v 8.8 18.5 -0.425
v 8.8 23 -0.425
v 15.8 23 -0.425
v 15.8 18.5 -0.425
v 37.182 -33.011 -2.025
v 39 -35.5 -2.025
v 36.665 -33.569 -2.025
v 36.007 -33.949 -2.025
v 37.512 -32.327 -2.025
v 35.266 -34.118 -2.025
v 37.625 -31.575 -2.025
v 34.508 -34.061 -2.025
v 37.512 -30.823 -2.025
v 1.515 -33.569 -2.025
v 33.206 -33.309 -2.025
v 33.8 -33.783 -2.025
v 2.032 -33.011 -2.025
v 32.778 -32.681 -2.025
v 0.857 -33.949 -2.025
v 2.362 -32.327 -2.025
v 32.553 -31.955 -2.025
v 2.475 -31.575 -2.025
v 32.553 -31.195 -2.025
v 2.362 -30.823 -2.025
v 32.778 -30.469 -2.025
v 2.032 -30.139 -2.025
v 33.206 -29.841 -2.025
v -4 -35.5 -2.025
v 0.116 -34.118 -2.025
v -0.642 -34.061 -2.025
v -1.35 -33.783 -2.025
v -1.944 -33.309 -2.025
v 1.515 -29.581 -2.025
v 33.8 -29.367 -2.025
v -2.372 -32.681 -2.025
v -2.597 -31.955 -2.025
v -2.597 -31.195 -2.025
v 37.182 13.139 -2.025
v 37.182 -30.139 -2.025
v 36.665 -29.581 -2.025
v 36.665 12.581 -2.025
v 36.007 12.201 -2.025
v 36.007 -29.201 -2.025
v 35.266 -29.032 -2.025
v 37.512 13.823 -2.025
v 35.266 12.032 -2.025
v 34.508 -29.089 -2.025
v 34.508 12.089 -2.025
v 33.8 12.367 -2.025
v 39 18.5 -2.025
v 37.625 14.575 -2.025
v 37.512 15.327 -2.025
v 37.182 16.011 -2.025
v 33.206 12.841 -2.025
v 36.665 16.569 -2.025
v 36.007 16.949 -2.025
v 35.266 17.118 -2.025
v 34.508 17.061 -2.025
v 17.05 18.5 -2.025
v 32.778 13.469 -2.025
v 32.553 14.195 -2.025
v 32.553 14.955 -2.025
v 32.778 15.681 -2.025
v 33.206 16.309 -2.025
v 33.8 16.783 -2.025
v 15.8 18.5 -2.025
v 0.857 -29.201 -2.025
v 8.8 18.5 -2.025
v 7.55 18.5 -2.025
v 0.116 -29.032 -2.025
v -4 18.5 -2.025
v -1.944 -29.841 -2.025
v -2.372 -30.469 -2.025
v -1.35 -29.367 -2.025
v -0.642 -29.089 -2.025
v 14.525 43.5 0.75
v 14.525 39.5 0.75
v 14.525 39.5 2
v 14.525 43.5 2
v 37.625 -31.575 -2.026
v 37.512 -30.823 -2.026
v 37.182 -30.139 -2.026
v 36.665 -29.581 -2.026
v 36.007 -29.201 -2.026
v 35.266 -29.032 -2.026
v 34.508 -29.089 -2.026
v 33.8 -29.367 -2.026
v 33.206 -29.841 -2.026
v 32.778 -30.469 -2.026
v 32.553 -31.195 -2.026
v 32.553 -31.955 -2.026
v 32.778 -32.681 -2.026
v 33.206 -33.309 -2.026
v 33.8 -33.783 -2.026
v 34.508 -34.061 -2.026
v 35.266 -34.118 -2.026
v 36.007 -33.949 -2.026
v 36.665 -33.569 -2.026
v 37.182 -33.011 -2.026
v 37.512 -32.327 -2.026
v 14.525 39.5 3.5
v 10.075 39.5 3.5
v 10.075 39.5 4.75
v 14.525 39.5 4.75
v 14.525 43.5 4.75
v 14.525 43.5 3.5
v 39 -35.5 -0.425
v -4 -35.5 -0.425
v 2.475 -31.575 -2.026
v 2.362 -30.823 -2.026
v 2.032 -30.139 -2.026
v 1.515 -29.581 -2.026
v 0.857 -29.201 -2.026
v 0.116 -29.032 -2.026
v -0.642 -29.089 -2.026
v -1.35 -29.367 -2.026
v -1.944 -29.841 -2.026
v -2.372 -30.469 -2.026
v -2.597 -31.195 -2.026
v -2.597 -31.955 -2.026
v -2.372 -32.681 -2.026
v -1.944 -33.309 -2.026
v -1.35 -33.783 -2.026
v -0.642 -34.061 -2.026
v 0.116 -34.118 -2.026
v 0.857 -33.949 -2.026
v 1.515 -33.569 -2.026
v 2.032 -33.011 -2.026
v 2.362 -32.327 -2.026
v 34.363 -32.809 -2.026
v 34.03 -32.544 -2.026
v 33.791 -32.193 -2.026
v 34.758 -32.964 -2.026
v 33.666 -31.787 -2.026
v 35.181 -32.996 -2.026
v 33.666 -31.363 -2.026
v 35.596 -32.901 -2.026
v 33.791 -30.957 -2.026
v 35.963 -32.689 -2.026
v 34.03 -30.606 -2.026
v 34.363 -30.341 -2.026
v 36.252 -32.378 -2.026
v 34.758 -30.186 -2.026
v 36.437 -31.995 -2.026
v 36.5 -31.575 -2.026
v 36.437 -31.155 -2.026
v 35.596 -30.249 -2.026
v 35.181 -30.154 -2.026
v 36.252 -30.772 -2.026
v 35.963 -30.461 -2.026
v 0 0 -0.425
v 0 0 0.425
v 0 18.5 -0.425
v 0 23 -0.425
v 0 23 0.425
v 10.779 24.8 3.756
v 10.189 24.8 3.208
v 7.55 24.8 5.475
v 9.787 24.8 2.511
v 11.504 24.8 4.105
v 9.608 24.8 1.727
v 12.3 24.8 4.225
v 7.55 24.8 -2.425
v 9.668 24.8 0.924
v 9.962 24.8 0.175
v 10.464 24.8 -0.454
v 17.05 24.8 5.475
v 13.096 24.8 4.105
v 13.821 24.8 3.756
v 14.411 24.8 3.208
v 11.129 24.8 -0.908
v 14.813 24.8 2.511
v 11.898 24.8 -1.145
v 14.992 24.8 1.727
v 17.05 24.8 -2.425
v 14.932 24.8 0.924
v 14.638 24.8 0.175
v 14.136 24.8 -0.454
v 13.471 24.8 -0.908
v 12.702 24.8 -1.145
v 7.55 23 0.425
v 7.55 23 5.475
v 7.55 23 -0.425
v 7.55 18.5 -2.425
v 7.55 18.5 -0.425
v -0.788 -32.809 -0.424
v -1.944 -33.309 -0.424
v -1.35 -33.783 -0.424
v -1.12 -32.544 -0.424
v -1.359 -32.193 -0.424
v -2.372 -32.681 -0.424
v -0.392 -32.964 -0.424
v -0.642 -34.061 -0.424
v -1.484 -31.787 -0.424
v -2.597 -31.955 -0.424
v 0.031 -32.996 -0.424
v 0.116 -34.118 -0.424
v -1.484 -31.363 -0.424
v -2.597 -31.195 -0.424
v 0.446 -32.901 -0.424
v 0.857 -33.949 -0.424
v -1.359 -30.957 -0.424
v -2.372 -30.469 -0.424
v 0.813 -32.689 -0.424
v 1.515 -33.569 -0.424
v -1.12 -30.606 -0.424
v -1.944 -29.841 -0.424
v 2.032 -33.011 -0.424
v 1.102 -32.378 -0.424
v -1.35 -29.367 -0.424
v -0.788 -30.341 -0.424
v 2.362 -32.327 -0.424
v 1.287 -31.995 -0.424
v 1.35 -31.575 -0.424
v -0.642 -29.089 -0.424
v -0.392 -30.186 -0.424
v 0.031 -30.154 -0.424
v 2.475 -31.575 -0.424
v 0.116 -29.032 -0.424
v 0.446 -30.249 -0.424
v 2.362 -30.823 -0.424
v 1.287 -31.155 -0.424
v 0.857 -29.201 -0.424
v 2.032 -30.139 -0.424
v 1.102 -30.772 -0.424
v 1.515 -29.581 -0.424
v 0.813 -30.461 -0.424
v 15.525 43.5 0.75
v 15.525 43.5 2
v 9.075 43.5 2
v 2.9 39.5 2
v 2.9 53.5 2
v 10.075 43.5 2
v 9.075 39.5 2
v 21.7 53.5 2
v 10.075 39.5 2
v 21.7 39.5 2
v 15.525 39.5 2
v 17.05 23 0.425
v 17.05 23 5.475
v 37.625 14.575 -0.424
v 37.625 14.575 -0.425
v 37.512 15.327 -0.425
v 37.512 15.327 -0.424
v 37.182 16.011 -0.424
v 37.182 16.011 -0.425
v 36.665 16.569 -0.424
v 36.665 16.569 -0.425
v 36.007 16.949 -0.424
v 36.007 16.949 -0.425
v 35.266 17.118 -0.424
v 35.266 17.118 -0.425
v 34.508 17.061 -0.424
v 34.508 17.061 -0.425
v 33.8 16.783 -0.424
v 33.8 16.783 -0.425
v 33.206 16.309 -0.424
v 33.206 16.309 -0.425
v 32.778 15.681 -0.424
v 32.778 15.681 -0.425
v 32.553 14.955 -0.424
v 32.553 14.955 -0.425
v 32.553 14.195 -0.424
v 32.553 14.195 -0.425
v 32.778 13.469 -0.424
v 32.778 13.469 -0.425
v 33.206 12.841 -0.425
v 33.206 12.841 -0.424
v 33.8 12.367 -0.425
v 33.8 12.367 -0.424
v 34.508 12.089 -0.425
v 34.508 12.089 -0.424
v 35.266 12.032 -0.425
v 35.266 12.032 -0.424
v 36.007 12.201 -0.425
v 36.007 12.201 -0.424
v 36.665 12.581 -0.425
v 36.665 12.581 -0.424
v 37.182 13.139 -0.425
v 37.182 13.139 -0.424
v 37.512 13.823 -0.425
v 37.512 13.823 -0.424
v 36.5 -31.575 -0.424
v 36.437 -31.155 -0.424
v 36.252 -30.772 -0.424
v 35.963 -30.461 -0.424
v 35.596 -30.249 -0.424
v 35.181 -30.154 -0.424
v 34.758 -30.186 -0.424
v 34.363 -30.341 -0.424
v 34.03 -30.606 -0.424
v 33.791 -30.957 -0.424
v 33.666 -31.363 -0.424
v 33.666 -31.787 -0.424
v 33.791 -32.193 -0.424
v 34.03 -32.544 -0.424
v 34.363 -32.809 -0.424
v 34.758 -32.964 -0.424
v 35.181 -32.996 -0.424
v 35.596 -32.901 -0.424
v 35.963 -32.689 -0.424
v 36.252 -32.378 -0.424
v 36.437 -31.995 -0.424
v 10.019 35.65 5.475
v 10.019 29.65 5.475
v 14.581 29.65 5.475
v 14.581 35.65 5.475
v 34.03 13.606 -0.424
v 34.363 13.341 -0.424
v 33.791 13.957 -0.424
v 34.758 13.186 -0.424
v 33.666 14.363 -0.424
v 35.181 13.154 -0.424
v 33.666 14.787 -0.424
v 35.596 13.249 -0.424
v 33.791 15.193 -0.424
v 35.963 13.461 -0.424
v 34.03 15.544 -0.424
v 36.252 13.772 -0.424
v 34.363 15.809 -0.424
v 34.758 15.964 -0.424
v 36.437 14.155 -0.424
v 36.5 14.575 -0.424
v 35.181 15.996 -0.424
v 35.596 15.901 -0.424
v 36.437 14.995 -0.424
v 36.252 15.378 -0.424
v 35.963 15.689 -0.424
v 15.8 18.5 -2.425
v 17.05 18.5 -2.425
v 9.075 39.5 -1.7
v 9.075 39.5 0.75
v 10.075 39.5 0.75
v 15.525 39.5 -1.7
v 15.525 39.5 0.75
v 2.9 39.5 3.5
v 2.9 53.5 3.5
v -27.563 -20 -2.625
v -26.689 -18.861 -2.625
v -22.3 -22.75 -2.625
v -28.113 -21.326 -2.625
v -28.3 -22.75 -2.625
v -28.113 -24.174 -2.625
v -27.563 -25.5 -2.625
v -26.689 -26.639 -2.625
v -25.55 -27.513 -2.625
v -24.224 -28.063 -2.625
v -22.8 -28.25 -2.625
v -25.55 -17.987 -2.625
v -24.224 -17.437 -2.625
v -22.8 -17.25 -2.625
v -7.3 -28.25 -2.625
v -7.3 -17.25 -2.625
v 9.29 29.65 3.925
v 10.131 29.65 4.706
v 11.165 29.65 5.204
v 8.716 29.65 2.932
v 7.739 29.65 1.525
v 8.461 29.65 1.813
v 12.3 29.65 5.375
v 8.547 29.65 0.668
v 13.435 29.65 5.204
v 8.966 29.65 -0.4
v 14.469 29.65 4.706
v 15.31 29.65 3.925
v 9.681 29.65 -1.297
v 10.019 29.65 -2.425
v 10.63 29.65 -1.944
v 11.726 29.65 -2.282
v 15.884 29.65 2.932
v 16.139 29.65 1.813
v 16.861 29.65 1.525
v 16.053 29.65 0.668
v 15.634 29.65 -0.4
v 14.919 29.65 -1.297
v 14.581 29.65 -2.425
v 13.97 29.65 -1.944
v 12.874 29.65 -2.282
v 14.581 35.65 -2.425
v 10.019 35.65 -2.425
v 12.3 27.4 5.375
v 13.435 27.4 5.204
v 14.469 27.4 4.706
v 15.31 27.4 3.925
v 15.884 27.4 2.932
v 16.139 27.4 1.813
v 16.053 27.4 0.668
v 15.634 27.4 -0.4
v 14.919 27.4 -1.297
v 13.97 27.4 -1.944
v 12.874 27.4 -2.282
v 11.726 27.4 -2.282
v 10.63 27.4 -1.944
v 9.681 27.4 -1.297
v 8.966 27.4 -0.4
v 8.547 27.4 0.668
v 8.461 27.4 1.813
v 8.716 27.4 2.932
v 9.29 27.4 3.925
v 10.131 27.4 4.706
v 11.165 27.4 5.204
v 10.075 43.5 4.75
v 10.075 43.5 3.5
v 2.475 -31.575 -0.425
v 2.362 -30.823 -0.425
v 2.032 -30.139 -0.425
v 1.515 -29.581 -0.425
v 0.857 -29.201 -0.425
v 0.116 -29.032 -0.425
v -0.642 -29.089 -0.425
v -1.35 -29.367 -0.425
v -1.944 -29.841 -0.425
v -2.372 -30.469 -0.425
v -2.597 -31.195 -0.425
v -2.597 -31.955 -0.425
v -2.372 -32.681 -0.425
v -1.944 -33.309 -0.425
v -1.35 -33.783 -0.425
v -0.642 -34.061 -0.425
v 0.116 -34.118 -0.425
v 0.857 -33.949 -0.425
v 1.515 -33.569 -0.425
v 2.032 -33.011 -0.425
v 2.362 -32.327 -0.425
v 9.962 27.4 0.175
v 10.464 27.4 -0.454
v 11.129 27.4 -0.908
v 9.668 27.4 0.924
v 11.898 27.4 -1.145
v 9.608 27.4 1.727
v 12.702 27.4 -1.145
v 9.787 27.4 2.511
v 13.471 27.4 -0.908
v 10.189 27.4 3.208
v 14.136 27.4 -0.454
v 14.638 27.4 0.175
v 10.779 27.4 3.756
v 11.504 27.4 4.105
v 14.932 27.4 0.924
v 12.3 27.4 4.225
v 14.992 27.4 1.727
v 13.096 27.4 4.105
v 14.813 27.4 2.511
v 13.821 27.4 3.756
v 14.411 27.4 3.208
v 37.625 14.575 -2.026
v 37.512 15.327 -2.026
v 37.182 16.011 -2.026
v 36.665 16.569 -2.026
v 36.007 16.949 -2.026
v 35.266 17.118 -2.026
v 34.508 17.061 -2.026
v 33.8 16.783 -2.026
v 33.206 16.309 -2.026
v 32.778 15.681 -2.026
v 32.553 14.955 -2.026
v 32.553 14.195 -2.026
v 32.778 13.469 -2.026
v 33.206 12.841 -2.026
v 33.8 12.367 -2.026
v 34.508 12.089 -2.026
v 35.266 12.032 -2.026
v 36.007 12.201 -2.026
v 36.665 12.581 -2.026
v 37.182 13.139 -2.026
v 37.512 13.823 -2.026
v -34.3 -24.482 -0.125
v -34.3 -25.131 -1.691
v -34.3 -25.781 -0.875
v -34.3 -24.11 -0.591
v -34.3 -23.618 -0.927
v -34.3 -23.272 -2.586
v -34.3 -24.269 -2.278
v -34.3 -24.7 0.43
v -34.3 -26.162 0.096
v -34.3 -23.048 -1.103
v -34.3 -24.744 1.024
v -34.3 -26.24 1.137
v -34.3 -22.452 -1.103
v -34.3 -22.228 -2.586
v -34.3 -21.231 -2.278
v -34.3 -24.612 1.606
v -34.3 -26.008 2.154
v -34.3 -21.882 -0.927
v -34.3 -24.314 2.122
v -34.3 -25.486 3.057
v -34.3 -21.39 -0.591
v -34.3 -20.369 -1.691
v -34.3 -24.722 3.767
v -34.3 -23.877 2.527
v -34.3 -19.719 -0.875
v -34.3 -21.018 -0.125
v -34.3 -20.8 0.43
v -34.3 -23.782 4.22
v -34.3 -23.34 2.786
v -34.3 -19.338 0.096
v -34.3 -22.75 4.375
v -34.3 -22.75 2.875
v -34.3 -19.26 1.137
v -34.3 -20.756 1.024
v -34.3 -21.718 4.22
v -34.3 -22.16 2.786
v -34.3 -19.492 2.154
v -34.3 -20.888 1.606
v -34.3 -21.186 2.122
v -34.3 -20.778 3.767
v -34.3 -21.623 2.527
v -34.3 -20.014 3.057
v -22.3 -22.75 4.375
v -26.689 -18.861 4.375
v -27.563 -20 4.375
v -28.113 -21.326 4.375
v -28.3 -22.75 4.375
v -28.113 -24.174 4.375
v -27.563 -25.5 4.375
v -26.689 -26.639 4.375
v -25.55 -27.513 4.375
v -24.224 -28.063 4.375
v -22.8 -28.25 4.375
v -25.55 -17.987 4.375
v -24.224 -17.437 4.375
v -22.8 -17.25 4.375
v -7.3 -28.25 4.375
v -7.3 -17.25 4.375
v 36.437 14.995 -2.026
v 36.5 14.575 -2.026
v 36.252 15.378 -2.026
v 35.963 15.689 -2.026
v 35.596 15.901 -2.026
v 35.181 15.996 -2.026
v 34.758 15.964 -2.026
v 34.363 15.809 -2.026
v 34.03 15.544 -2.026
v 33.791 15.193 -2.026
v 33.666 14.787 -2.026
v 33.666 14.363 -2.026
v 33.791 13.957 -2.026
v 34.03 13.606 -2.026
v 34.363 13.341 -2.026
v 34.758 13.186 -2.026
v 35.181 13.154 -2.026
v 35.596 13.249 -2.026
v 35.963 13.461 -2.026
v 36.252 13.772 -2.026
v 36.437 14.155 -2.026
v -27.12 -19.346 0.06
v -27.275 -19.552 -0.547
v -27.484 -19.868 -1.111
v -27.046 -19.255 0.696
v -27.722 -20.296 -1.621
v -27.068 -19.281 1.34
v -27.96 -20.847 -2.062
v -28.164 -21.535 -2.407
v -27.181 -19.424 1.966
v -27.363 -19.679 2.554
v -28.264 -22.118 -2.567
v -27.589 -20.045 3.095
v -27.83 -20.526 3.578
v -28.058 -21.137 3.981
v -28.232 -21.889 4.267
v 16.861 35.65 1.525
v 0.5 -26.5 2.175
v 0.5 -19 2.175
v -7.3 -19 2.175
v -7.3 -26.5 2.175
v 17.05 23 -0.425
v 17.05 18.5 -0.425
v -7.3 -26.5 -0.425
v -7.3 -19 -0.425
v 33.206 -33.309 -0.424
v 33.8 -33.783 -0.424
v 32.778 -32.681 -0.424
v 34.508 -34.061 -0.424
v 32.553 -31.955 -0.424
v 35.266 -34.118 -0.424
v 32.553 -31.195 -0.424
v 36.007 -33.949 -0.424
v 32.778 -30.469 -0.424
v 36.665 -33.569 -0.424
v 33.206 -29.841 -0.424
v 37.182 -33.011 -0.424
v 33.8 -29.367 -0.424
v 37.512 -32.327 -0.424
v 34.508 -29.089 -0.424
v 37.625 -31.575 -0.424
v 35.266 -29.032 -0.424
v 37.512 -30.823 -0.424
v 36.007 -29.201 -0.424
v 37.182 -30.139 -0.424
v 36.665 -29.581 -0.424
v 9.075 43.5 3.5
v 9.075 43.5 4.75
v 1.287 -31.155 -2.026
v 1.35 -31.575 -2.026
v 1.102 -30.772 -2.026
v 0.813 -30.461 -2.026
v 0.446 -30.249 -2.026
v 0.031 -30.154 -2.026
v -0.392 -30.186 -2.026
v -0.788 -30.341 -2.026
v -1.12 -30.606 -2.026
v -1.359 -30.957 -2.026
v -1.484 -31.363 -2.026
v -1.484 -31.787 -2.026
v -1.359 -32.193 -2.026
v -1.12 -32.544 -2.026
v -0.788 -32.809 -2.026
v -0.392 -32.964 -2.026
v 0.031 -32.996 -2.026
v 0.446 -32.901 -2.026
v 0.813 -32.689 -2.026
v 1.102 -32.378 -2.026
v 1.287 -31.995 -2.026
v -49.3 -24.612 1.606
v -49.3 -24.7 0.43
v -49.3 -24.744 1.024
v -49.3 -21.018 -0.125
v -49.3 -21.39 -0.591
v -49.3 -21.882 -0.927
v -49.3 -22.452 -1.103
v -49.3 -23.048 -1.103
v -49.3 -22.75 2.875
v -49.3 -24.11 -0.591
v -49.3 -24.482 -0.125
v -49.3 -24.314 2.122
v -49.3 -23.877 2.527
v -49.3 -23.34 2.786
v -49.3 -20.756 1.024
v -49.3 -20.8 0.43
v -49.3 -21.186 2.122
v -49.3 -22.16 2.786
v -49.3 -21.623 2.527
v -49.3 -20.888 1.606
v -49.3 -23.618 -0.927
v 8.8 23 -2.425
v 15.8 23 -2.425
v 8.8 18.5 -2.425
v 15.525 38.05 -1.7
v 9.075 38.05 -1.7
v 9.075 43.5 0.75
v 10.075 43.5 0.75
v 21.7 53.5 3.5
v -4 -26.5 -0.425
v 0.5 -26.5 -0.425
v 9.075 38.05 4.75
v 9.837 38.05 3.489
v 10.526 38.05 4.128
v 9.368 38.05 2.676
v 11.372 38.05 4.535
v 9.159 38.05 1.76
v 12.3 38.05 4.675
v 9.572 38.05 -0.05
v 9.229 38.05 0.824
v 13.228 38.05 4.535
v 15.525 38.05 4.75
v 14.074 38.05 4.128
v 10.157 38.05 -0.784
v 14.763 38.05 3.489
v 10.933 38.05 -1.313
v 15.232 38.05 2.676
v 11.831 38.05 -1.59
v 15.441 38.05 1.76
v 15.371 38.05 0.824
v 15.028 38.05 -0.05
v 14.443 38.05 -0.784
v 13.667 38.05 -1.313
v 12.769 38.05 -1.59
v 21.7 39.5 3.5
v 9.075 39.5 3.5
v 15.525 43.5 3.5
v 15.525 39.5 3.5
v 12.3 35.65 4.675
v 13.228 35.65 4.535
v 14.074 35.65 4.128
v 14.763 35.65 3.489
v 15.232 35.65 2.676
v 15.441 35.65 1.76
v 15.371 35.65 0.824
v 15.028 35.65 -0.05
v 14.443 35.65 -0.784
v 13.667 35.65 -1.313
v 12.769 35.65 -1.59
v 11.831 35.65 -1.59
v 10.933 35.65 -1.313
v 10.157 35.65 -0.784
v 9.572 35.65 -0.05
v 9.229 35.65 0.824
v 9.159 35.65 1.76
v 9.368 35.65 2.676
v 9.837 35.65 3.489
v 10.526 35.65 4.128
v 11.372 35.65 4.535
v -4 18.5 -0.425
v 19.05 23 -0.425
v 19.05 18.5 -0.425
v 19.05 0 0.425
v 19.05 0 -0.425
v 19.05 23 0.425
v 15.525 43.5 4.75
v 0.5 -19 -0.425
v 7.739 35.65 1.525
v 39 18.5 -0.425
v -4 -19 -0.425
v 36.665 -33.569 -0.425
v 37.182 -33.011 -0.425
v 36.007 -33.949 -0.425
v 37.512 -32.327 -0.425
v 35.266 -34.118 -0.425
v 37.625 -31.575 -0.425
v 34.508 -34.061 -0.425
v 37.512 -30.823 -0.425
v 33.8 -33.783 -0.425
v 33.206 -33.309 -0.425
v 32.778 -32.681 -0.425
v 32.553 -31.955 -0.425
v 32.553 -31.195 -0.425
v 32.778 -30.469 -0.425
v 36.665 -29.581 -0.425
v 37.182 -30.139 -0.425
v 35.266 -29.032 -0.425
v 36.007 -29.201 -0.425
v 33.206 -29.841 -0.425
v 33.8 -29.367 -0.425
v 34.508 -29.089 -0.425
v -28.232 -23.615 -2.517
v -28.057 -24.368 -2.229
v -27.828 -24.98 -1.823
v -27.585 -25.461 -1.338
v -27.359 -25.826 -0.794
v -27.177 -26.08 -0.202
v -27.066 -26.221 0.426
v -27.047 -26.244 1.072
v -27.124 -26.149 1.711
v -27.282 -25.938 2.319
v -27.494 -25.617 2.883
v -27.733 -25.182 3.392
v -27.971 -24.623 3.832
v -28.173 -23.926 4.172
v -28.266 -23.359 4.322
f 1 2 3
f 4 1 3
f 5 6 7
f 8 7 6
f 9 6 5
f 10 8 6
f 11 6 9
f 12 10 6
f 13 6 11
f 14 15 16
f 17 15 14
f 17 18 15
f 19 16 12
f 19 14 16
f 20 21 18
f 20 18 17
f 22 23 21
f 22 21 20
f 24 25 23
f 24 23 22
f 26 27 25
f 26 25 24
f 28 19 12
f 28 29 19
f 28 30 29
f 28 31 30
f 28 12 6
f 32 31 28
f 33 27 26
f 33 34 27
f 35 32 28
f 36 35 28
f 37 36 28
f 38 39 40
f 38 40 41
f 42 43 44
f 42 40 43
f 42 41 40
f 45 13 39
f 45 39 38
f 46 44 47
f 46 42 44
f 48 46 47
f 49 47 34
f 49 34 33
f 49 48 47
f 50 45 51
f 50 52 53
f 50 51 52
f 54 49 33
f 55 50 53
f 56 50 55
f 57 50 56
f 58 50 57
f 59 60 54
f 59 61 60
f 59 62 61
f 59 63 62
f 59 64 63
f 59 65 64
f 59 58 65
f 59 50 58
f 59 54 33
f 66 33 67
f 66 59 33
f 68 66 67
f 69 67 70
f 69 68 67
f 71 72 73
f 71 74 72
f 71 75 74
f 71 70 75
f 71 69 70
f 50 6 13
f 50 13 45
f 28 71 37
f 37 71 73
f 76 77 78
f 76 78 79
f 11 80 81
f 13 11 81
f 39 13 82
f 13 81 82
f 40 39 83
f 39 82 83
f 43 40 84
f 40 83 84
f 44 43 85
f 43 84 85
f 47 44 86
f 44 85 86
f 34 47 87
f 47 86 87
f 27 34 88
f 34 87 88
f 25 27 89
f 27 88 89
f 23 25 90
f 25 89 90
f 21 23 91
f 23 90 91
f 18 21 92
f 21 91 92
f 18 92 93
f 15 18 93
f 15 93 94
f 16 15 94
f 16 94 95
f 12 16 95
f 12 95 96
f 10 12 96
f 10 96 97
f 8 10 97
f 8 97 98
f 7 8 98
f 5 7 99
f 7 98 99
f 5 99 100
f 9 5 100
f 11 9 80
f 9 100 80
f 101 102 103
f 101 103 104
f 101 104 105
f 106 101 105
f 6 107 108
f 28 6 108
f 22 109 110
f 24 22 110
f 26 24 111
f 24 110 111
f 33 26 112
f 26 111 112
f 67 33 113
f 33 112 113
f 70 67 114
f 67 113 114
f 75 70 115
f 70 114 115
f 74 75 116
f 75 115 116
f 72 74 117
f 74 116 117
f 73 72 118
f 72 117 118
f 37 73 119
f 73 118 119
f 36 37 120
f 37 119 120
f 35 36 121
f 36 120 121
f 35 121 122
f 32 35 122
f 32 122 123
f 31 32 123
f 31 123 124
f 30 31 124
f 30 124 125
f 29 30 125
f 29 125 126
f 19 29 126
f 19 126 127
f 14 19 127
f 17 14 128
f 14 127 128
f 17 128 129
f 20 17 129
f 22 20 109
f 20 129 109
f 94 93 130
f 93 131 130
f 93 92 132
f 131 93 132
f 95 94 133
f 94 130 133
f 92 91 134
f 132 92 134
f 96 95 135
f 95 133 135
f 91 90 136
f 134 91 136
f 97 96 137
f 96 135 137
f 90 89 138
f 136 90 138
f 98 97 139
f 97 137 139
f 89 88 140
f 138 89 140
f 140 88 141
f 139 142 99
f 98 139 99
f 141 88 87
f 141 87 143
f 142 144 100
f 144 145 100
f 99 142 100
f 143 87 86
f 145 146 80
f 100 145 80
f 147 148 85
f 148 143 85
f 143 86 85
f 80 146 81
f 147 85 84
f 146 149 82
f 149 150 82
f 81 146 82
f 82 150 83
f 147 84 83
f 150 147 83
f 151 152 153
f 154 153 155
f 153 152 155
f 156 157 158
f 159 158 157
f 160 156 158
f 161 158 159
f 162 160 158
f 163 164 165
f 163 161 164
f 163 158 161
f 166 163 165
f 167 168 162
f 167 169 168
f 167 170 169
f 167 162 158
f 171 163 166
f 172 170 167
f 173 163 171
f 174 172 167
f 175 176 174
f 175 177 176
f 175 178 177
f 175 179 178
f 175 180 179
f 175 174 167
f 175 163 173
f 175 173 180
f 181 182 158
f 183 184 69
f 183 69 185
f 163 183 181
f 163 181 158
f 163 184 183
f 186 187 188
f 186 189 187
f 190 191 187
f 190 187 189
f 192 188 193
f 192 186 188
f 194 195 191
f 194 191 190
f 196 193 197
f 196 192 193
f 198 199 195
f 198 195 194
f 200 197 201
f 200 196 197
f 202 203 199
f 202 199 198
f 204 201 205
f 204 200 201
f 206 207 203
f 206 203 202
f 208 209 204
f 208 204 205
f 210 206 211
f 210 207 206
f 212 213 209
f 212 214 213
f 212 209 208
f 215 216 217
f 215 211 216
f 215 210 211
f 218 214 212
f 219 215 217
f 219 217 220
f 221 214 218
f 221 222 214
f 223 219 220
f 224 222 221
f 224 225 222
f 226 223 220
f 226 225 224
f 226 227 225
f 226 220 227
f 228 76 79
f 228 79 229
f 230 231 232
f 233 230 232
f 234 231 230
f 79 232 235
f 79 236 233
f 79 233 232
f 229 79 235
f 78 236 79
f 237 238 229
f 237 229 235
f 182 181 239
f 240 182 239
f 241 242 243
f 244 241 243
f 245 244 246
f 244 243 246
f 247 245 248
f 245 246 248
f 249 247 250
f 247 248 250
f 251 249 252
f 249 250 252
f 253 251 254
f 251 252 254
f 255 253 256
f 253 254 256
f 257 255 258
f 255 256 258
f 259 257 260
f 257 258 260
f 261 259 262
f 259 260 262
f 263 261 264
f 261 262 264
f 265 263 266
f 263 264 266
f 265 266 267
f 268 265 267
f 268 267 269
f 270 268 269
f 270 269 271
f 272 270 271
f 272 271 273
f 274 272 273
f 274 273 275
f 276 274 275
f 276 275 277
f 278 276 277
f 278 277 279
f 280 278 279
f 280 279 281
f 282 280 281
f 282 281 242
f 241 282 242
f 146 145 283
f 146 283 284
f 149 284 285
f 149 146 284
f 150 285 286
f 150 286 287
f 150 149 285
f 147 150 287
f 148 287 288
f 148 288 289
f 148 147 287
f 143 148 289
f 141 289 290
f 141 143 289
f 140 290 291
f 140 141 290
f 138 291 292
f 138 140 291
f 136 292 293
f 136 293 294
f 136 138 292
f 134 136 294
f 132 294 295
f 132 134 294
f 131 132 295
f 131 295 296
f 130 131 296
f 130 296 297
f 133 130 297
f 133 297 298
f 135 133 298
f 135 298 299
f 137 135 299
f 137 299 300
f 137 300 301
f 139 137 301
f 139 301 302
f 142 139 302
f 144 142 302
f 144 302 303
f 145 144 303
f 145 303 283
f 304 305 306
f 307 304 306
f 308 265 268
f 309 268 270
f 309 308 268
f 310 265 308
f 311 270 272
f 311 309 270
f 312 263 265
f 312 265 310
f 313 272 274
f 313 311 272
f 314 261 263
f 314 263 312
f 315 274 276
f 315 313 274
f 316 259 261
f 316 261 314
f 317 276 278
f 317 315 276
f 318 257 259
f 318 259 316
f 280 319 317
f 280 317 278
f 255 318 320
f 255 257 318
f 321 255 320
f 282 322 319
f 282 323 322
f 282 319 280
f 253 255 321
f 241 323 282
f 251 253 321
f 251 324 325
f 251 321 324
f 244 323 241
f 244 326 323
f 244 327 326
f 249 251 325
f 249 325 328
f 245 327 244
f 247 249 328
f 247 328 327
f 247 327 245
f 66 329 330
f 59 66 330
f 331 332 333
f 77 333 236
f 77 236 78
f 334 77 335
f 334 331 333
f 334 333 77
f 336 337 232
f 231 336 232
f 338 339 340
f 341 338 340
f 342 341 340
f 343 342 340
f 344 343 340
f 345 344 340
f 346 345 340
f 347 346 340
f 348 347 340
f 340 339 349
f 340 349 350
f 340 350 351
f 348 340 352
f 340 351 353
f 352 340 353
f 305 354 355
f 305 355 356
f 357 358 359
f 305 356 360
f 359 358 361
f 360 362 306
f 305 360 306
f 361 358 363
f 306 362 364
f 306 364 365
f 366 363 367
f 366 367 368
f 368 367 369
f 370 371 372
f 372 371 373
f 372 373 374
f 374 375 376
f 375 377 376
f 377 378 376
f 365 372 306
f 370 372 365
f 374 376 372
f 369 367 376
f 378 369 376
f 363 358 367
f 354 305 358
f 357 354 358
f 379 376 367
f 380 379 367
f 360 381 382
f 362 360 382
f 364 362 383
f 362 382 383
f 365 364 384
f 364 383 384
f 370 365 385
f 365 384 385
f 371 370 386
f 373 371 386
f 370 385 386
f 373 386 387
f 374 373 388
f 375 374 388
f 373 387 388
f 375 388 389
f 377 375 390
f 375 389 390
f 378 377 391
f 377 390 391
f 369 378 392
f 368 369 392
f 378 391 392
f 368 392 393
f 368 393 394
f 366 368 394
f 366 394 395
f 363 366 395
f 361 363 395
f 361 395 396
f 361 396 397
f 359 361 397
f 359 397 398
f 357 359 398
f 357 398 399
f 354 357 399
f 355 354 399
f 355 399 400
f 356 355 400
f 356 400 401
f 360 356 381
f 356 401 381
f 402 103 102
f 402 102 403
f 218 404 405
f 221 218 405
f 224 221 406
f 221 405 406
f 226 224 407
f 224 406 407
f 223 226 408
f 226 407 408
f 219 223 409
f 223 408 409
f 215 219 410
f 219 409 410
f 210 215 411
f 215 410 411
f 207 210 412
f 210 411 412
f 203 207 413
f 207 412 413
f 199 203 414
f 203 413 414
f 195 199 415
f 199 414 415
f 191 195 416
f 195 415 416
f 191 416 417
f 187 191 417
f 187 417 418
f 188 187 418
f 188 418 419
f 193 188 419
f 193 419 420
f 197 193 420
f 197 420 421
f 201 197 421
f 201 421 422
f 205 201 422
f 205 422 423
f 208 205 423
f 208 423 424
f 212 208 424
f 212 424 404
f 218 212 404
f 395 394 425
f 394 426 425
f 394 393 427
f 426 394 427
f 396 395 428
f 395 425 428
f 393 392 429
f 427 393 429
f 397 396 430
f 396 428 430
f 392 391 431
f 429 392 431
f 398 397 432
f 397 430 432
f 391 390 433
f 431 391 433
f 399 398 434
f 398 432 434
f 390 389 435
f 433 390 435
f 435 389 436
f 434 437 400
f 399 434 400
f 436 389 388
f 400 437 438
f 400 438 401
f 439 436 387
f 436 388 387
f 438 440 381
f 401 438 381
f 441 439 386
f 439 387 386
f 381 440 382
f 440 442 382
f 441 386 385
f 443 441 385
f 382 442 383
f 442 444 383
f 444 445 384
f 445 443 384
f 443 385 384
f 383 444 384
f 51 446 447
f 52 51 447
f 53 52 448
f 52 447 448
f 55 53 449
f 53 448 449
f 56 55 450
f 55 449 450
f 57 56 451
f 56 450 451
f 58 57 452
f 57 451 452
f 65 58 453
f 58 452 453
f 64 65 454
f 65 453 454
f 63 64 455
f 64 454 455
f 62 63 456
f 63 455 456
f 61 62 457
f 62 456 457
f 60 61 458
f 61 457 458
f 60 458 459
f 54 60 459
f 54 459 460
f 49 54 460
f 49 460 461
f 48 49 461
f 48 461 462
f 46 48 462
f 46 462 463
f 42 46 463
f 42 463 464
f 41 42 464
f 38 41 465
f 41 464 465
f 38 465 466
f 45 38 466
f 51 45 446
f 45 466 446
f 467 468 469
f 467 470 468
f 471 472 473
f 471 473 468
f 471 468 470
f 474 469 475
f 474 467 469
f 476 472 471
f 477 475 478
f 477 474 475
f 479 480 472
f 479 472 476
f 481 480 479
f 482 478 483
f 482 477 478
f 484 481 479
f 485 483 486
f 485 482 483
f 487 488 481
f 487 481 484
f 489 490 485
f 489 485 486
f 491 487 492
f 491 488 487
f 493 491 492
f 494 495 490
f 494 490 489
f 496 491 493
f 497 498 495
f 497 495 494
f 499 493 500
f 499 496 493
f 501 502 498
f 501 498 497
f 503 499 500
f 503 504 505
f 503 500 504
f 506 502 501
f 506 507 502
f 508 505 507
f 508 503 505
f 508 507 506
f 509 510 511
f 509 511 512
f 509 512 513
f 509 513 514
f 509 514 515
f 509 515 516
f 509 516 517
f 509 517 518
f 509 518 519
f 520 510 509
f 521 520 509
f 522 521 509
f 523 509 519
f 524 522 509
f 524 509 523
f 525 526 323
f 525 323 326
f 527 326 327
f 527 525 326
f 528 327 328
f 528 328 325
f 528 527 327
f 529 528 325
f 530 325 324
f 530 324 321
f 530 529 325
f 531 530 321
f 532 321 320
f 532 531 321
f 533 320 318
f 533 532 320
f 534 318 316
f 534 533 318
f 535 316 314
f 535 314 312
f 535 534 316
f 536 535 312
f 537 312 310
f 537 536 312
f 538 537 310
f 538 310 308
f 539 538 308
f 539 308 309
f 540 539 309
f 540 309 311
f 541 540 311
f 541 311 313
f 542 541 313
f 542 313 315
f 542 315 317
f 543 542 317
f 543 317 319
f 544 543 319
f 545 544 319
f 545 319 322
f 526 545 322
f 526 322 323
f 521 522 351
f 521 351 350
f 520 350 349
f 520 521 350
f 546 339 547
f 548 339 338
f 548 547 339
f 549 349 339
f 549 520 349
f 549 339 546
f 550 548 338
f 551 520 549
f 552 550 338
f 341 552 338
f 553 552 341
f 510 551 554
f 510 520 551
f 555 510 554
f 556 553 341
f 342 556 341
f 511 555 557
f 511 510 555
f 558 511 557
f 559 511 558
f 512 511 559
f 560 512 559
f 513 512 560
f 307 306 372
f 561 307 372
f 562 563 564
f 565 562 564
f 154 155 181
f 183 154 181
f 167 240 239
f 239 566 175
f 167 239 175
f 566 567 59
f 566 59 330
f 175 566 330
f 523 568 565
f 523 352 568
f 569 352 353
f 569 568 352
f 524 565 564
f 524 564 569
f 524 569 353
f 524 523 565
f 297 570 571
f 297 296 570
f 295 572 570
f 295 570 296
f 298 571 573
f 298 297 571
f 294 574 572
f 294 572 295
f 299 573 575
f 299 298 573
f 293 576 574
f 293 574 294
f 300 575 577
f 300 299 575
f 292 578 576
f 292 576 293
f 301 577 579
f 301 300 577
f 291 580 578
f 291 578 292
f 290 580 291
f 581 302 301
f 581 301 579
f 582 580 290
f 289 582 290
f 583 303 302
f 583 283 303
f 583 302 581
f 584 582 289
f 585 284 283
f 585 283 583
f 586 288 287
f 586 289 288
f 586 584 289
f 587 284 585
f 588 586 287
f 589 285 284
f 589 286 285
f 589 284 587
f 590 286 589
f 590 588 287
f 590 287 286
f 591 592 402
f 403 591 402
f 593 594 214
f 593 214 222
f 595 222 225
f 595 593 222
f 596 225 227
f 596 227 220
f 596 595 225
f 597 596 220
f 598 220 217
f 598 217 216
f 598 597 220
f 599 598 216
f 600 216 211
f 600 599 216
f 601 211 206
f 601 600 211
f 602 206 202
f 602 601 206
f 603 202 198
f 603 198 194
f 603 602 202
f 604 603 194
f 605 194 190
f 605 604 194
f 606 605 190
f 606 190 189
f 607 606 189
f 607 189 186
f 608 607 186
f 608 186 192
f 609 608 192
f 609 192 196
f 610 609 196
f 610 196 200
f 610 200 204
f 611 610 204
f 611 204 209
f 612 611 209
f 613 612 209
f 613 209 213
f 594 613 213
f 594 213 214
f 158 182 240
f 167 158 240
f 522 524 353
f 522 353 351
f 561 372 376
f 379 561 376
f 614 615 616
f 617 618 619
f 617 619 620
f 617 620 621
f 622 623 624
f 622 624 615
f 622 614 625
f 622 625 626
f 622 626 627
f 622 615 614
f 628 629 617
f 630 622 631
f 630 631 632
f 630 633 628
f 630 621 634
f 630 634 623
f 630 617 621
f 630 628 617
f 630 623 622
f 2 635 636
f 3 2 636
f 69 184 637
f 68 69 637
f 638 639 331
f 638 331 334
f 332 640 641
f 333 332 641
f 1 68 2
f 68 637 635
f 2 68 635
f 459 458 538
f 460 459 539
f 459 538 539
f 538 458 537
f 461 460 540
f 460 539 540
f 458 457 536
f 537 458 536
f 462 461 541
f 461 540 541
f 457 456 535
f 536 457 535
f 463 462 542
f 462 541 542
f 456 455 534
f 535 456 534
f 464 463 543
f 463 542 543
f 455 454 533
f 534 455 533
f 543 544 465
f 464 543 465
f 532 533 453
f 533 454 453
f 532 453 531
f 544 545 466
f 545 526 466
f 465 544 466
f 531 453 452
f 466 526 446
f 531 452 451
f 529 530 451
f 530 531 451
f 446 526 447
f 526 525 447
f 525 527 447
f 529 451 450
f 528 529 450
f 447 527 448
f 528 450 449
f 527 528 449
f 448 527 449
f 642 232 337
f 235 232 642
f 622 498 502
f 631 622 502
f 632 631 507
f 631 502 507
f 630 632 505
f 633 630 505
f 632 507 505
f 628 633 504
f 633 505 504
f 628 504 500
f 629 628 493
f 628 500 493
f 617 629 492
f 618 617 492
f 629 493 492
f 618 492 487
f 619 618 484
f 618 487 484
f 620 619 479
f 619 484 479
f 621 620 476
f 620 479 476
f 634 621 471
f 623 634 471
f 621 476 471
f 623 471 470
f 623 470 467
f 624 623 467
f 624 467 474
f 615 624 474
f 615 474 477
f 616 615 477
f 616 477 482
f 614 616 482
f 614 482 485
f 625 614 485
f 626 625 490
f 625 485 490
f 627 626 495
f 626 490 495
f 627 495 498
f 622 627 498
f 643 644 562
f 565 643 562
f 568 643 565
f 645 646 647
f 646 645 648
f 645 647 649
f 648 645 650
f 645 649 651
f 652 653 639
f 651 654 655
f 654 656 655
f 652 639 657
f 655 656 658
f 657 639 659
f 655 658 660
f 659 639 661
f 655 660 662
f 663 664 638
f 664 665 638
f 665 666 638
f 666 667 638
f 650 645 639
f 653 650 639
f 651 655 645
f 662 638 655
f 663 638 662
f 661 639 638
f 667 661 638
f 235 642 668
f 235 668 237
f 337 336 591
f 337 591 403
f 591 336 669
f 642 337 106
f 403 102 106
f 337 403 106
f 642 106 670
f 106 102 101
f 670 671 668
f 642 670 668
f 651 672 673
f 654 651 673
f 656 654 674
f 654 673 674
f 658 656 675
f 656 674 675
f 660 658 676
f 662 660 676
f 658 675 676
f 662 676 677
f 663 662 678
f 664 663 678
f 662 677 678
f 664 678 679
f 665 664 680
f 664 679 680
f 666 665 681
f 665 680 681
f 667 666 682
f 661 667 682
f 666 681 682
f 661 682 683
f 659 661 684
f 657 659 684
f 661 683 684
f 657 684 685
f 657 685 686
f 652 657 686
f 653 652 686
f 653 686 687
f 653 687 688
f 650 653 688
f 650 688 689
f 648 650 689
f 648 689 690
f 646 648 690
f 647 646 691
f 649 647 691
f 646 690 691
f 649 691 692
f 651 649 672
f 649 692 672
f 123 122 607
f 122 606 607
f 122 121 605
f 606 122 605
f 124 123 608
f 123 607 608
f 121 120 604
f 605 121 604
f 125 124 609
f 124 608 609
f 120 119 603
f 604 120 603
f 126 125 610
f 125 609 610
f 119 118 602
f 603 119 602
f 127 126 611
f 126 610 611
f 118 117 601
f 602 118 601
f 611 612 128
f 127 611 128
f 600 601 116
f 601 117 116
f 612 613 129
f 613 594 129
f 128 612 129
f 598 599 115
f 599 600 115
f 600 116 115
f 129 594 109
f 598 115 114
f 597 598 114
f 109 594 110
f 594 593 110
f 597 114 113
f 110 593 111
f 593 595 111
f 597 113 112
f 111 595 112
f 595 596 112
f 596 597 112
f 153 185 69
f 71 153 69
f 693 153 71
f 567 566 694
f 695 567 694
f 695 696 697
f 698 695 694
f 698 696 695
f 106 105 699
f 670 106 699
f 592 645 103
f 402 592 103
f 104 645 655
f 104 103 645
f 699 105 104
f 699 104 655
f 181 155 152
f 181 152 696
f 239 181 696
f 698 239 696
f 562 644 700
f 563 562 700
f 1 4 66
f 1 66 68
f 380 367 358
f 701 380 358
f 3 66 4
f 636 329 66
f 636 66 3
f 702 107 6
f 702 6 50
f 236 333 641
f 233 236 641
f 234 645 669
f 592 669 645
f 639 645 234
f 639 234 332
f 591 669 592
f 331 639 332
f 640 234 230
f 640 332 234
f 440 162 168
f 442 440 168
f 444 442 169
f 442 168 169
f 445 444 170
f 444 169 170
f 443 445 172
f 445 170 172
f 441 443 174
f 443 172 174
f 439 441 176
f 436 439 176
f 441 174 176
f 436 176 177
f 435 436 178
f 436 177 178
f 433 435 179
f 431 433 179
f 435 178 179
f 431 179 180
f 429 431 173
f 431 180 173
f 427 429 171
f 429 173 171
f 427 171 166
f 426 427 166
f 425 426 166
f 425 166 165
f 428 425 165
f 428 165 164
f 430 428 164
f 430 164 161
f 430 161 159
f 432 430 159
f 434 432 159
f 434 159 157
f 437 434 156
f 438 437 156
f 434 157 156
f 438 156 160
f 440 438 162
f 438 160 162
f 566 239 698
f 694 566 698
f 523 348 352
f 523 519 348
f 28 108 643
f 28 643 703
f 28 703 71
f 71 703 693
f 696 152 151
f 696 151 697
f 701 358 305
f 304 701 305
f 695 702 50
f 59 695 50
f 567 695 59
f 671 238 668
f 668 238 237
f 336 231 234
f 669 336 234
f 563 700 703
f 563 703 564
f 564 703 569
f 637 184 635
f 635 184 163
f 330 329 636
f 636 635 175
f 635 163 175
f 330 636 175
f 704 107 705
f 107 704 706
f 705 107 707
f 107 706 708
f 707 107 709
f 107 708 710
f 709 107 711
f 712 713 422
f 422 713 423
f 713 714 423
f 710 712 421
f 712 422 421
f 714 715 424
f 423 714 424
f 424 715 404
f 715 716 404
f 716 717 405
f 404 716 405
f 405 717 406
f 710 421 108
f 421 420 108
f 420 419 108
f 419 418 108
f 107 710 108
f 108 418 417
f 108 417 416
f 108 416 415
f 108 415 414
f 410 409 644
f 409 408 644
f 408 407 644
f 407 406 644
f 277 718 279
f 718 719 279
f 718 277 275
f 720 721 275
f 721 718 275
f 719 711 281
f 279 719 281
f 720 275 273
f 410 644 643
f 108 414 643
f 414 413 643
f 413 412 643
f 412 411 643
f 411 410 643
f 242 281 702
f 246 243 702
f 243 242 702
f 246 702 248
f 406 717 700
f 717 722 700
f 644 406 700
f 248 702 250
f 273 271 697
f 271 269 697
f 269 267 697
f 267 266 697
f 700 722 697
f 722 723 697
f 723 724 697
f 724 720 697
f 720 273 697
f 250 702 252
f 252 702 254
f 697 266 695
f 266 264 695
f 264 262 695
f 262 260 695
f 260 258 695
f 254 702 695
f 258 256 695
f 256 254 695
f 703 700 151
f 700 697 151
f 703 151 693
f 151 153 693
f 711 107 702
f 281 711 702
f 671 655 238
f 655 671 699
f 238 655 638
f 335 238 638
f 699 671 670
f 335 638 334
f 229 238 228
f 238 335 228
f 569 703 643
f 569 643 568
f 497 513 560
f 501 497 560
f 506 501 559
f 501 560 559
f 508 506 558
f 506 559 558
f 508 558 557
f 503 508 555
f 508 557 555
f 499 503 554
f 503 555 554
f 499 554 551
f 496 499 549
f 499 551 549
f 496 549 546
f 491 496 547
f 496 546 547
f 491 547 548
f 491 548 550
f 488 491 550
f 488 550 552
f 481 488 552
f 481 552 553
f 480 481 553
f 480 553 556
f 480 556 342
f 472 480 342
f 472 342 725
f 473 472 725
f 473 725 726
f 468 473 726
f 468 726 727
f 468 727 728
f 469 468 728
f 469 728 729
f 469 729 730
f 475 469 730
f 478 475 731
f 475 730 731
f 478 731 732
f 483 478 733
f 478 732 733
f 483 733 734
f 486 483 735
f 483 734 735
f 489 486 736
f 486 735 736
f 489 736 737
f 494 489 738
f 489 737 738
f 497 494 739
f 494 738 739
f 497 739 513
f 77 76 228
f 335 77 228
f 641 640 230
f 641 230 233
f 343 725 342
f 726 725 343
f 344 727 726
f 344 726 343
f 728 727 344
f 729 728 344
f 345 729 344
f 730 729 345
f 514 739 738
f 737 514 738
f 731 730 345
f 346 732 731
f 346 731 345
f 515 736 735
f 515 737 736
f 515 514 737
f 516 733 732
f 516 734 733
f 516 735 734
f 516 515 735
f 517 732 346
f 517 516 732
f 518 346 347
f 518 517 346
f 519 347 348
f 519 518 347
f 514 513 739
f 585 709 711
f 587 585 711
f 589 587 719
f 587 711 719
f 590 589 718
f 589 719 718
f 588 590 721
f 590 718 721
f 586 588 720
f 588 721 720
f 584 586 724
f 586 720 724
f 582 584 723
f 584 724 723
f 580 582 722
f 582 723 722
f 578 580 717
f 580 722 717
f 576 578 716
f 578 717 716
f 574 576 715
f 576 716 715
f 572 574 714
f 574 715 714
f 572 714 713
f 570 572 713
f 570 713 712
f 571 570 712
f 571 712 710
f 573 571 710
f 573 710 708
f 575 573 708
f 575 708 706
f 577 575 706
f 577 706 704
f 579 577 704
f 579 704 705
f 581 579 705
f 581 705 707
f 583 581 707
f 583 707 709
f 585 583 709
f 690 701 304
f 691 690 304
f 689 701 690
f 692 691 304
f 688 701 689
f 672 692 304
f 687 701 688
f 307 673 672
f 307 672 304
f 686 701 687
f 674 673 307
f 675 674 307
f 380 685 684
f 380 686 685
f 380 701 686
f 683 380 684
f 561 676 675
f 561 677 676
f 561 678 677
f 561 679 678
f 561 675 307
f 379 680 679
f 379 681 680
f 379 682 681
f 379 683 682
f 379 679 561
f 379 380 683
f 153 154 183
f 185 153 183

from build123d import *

# Parameters (mm, degrees)
SKETCH1_W                     = 19.05
SKETCH1_H                     = 23
BLUE_PCB_DEPTH                = 0.425
SKETCH20_W                    = 43
SKETCH20_H                    = 54
GREEN_PCB_DEPTH               = 1.6
SKETCH21_R                    = 1.425
MOUNTING_HOLES_DEPTH          = 53.76182332
SCREW_MASK_DEPTH              = 0.801
SCREW_MASK_DEPTH_BACK         = 0.801
SKETCH22_R                    = 2.55
SKETCH22_R_2                  = 1.425
SKETCH4_W                     = 9.5
SKETCH4_H                     = 7.9
ANTENNA1_DEPTH                = 1.8
SKETCH10_W                    = 1.25
SKETCH10_H                    = 4.5
ANTENNA2_DEPTH                = 2
SKETCH5_R                     = 2.7
ANTENNA3_DEPTH                = 2.6
SKETCH6_R                     = 3.85
ANTENNA4_DEPTH                = 2.25
ANTENNA5_DEPTH                = 6
SKETCH8_R                     = 3.15
ANTENNA6_DEPTH                = 2.4
SKETCH9_W                     = 6.45
SKETCH9_H                     = 6.45
ANTENNA7_DEPTH                = 1.45
SKETCH19_W                    = 1
SKETCH19_H                    = 4
ANTENNA8_DEPTH                = 1.25
SKETCH11_W                    = 18.8
SKETCH11_H                    = 1.5
ANTENNA_PCB_DEPTH             = 14
SKETCH14_W                    = 7.8
SKETCH14_H                    = 7.5
USB_PORT_DEPTH                = 2.6
USB_BODY_DEPTH                = 3.5
USB_TENSION_RELIEF_DEPTH      = 6
USB_TENSION_RELIEF_DEPTH_BACK = 6
SKETCH17_R                    = 3.5
SKETCH18_R                    = 2
USB_CORD_DEPTH                = 15


with BuildPart() as part:
    # Sketch1 → Blue PCB (new, symmetric)
    with BuildSketch(Plane.XY):
        with Locations((9.525, 11.5)):
            Rectangle(SKETCH1_W, SKETCH1_H)
    extrude(amount=BLUE_PCB_DEPTH, both=True)

    # Sketch20 → Green PCB (add)
    with BuildSketch(Plane(origin=(0, 0, -0.425), x_dir=(-1, 0, 0), z_dir=(0, 0, -1))):
        with Locations((-17.5, -8.5)):
            Rectangle(SKETCH20_W, SKETCH20_H)
    extrude(amount=GREEN_PCB_DEPTH)

    # Sketch21 → Mounting Holes (cut, through all)
    with BuildSketch(Plane.XY.offset(-0.425)):
        with Locations((35.075, 14.575)):
            Circle(SKETCH21_R)
        with Locations((35.075, -31.575)):
            Circle(SKETCH21_R)
        with Locations((-0.075, -31.575)):
            Circle(SKETCH21_R)
    extrude(amount=-MOUNTING_HOLES_DEPTH, mode=Mode.SUBTRACT)

    # Sketch22 → Screw Mask (add, two sides: drawn at the far end of the back side and taken through both)
    # profile 1 of 3: a face of its own
    with BuildSketch(Plane.XY.offset(-1.225).offset(-SCREW_MASK_DEPTH_BACK)):
        with Locations((35.075, 14.575)):
            Circle(SKETCH22_R)
        with Locations((35.075, 14.575)):
            Circle(SKETCH22_R_2, mode=Mode.SUBTRACT)
    # profile 2 of 3: a face of its own
    with BuildSketch(Plane.XY.offset(-1.225).offset(-SCREW_MASK_DEPTH_BACK)):
        with Locations((35.075, -31.575)):
            Circle(SKETCH22_R)
        with Locations((35.075, -31.575)):
            Circle(SKETCH22_R_2, mode=Mode.SUBTRACT)
    # profile 3 of 3: a face of its own
    with BuildSketch(Plane.XY.offset(-1.225).offset(-SCREW_MASK_DEPTH_BACK)):
        with Locations((-0.075, -31.575)):
            Circle(SKETCH22_R)
        with Locations((-0.075, -31.575)):
            Circle(SKETCH22_R_2, mode=Mode.SUBTRACT)
    extrude(amount=SCREW_MASK_DEPTH + SCREW_MASK_DEPTH_BACK)

    # Sketch4 → Antenna1 (add)
    with BuildSketch(Plane(origin=(0, 23, 0), x_dir=(1, 0, 0), z_dir=(0, 1, 0))):
        with Locations((12.3, -1.525)):
            Rectangle(SKETCH4_W, SKETCH4_H)
    extrude(amount=ANTENNA1_DEPTH)

    # Sketch10 → Antenna2 (add)
    with BuildSketch(Plane.XY.offset(-2.425)):
        with Locations((8.175, 20.75)):
            Rectangle(SKETCH10_W, SKETCH10_H)
        with Locations((16.425, 20.75)):
            Rectangle(SKETCH10_W, SKETCH10_H)
    extrude(amount=ANTENNA2_DEPTH)

    # Sketch5 → Antenna3 (add)
    with BuildSketch(Plane(origin=(0, 24.8, 0), x_dir=(1, 0, 0), z_dir=(0, 1, 0))):
        with Locations(Location((12.3, -1.525, 0), (0, 0, 270))):
            Circle(SKETCH5_R)
    extrude(amount=ANTENNA3_DEPTH)

    # Sketch6 → Antenna4 (add)
    with BuildSketch(Plane(origin=(0, 27.4, 0), x_dir=(1, 0, 0), z_dir=(0, 1, 0))):
        with Locations(Location((12.3, -1.525, 0), (0, 0, 270))):
            Circle(SKETCH6_R)
    extrude(amount=ANTENNA4_DEPTH)

    # Sketch7 → Antenna5 (add)
    with BuildSketch(Plane(origin=(0, 29.65, 0), x_dir=(1, 0, 0), z_dir=(0, 1, 0))):
        Polygon((10.019466437, -5.475), (14.580533563, -5.475), (16.861067127, -1.525), (14.580533563, 2.425), (10.019466437, 2.425), (7.738932873, -1.525), align=None)
    extrude(amount=ANTENNA5_DEPTH)

    # Sketch8 → Antenna6 (add)
    with BuildSketch(Plane(origin=(0, 35.65, 0), x_dir=(1, 0, 0), z_dir=(0, 1, 0))):
        with Locations(Location((12.3, -1.525, 0), (0, 0, 270))):
            Circle(SKETCH8_R)
    extrude(amount=ANTENNA6_DEPTH)

    # Sketch9 → Antenna7 (add)
    with BuildSketch(Plane(origin=(0, 38.05, 0), x_dir=(1, 0, 0), z_dir=(0, 1, 0))):
        with Locations((12.3, -1.525)):
            Rectangle(SKETCH9_W, SKETCH9_H)
    extrude(amount=ANTENNA7_DEPTH)

    # Sketch19 → Antenna8 (add)
    with BuildSketch(Plane.XY.offset(4.75)):
        with Locations((9.575, 41.5)):
            Rectangle(SKETCH19_W, SKETCH19_H)
        with Locations((15.025, 41.5)):
            Rectangle(SKETCH19_W, SKETCH19_H)
    antenna8 = extrude(amount=-ANTENNA8_DEPTH)

    # Sketch11 → Antenna PCB (add)
    with BuildSketch(Plane(origin=(0, 39.5, 0), x_dir=(1, 0, 0), z_dir=(0, 1, 0))):
        with Locations((12.3, -2.75)):
            Rectangle(SKETCH11_W, SKETCH11_H)
    extrude(amount=ANTENNA_PCB_DEPTH)

    # Sketch14 → USB Port (add)
    with BuildSketch(Plane(origin=(0, 0, -0.425), x_dir=(-1, 0, 0), z_dir=(0, 0, -1))):
        with Locations((3.4, -22.75)):
            Rectangle(SKETCH14_W, SKETCH14_H)
    extrude(amount=-USB_PORT_DEPTH)

    # Sketch16 → USB Body (add, symmetric)
    with BuildSketch(Plane.XY.offset(0.875)):
        with BuildLine():
            Line((-22.8, -28.25), (-7.3, -28.25))
            Line((-7.3, -28.25), (-7.3, -17.25))
            Line((-7.3, -17.25), (-22.8, -17.25))
            ThreePointArc((-22.8, -17.25), (-28.3, -22.75), (-22.8, -28.25))
        make_face()
    extrude(amount=USB_BODY_DEPTH, both=True)

    # Sketch17 → USB Tension Relief (add, two sides: drawn at the far end of the back side and taken through both)
    with BuildSketch(Plane.ZY.offset(28.3).offset(-USB_TENSION_RELIEF_DEPTH_BACK)):
        with Locations((0.875, -22.75)):
            Circle(SKETCH17_R)
    extrude(amount=USB_TENSION_RELIEF_DEPTH + USB_TENSION_RELIEF_DEPTH_BACK)

    # Sketch18 → USB Cord (add)
    with BuildSketch(Plane.ZY.offset(34.3)):
        with Locations((0.875, -22.75)):
            Circle(SKETCH18_R)
    extrude(amount=USB_CORD_DEPTH)

    # Mirror1: Antenna8 across plane
    add(antenna8.mirror(Plane(origin=(0, 0, 2.75), x_dir=(1, 0, 0), z_dir=(0, 0, -1))))


solid = part.part
